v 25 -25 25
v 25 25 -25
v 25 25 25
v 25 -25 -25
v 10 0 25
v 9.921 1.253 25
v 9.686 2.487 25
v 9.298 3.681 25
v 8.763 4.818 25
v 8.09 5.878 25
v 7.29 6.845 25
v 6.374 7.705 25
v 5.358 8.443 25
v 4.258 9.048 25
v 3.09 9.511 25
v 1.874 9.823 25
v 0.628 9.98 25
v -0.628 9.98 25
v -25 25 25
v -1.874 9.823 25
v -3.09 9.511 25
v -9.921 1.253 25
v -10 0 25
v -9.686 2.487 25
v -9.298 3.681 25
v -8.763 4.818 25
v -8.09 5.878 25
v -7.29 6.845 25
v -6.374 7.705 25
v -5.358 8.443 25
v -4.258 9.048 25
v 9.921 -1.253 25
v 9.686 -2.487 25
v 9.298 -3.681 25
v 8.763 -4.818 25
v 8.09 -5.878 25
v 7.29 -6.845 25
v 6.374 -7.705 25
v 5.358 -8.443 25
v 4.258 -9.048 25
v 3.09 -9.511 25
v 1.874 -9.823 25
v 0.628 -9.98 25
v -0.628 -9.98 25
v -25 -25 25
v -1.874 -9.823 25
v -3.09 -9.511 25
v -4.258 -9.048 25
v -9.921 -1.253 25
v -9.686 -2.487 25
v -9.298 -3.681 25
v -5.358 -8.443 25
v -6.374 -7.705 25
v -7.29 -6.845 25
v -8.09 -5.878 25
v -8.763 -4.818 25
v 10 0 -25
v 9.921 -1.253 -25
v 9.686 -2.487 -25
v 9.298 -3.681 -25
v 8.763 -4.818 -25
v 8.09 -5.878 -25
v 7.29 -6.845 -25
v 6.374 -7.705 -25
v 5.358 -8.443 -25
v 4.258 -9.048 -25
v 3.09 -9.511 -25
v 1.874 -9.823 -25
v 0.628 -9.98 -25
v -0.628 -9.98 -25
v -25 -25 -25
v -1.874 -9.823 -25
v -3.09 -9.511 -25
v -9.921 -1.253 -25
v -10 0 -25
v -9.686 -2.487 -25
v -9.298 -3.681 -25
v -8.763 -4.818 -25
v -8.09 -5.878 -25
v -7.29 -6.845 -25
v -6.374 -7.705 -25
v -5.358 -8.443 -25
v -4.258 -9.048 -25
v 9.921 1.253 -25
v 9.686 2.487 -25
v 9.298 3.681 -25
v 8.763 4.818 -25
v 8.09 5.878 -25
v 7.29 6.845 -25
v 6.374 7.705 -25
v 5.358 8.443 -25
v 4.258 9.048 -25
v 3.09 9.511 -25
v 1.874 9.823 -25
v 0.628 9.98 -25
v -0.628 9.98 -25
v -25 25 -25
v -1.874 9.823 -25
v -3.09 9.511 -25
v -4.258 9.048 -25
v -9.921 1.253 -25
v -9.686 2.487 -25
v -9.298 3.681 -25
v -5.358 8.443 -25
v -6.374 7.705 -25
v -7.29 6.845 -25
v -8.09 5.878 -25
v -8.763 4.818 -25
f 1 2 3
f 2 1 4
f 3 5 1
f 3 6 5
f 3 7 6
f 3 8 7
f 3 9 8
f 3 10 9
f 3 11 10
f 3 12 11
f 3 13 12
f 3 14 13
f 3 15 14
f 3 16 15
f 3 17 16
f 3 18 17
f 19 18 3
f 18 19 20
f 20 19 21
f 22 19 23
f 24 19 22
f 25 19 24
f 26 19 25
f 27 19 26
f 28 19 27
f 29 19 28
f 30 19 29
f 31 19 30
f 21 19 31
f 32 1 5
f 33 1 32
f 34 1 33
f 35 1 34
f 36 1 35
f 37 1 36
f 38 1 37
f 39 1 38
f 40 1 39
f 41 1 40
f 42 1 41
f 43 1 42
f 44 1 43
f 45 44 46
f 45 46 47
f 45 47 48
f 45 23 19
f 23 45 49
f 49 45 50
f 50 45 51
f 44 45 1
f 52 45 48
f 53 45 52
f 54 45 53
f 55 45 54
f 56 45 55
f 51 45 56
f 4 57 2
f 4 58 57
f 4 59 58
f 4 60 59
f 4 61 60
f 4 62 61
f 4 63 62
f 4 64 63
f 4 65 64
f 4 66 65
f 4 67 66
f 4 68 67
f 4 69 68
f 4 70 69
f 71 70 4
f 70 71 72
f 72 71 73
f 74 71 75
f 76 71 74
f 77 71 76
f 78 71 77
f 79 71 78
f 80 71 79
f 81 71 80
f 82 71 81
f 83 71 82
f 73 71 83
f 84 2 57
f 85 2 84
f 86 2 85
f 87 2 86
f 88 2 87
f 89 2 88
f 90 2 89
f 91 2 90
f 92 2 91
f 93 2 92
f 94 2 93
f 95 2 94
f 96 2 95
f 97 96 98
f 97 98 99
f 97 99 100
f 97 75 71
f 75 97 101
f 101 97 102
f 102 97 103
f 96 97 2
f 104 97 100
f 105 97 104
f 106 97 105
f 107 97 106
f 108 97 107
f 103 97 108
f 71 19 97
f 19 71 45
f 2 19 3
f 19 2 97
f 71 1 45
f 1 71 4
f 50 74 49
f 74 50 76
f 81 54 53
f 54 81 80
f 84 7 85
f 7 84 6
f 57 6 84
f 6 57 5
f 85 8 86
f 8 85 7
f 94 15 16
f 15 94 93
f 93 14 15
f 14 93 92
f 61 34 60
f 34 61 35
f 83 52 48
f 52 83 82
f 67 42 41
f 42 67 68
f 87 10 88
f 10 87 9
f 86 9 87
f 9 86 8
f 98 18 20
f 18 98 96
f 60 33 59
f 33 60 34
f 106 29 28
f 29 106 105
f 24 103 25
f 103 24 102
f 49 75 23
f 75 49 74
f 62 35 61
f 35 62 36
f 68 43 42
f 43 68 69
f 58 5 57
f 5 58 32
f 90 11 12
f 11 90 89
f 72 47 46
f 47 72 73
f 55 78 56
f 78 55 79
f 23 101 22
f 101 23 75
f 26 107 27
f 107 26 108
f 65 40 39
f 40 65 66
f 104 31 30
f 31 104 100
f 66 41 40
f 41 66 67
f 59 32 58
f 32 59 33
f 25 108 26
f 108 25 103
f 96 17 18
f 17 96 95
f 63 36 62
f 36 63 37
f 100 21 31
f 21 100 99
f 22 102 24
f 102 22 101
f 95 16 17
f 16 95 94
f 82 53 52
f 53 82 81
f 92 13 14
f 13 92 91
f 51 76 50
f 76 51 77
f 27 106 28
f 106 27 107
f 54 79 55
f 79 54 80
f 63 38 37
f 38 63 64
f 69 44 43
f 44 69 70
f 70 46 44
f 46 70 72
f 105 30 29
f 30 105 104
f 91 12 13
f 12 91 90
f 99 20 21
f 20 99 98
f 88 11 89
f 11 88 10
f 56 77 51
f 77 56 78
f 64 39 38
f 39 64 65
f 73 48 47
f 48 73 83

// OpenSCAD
difference() {
    cube([50, 50, 50], center = true);
    cylinder(h = 60, d = 20, center = true, $fn = 50);
}
